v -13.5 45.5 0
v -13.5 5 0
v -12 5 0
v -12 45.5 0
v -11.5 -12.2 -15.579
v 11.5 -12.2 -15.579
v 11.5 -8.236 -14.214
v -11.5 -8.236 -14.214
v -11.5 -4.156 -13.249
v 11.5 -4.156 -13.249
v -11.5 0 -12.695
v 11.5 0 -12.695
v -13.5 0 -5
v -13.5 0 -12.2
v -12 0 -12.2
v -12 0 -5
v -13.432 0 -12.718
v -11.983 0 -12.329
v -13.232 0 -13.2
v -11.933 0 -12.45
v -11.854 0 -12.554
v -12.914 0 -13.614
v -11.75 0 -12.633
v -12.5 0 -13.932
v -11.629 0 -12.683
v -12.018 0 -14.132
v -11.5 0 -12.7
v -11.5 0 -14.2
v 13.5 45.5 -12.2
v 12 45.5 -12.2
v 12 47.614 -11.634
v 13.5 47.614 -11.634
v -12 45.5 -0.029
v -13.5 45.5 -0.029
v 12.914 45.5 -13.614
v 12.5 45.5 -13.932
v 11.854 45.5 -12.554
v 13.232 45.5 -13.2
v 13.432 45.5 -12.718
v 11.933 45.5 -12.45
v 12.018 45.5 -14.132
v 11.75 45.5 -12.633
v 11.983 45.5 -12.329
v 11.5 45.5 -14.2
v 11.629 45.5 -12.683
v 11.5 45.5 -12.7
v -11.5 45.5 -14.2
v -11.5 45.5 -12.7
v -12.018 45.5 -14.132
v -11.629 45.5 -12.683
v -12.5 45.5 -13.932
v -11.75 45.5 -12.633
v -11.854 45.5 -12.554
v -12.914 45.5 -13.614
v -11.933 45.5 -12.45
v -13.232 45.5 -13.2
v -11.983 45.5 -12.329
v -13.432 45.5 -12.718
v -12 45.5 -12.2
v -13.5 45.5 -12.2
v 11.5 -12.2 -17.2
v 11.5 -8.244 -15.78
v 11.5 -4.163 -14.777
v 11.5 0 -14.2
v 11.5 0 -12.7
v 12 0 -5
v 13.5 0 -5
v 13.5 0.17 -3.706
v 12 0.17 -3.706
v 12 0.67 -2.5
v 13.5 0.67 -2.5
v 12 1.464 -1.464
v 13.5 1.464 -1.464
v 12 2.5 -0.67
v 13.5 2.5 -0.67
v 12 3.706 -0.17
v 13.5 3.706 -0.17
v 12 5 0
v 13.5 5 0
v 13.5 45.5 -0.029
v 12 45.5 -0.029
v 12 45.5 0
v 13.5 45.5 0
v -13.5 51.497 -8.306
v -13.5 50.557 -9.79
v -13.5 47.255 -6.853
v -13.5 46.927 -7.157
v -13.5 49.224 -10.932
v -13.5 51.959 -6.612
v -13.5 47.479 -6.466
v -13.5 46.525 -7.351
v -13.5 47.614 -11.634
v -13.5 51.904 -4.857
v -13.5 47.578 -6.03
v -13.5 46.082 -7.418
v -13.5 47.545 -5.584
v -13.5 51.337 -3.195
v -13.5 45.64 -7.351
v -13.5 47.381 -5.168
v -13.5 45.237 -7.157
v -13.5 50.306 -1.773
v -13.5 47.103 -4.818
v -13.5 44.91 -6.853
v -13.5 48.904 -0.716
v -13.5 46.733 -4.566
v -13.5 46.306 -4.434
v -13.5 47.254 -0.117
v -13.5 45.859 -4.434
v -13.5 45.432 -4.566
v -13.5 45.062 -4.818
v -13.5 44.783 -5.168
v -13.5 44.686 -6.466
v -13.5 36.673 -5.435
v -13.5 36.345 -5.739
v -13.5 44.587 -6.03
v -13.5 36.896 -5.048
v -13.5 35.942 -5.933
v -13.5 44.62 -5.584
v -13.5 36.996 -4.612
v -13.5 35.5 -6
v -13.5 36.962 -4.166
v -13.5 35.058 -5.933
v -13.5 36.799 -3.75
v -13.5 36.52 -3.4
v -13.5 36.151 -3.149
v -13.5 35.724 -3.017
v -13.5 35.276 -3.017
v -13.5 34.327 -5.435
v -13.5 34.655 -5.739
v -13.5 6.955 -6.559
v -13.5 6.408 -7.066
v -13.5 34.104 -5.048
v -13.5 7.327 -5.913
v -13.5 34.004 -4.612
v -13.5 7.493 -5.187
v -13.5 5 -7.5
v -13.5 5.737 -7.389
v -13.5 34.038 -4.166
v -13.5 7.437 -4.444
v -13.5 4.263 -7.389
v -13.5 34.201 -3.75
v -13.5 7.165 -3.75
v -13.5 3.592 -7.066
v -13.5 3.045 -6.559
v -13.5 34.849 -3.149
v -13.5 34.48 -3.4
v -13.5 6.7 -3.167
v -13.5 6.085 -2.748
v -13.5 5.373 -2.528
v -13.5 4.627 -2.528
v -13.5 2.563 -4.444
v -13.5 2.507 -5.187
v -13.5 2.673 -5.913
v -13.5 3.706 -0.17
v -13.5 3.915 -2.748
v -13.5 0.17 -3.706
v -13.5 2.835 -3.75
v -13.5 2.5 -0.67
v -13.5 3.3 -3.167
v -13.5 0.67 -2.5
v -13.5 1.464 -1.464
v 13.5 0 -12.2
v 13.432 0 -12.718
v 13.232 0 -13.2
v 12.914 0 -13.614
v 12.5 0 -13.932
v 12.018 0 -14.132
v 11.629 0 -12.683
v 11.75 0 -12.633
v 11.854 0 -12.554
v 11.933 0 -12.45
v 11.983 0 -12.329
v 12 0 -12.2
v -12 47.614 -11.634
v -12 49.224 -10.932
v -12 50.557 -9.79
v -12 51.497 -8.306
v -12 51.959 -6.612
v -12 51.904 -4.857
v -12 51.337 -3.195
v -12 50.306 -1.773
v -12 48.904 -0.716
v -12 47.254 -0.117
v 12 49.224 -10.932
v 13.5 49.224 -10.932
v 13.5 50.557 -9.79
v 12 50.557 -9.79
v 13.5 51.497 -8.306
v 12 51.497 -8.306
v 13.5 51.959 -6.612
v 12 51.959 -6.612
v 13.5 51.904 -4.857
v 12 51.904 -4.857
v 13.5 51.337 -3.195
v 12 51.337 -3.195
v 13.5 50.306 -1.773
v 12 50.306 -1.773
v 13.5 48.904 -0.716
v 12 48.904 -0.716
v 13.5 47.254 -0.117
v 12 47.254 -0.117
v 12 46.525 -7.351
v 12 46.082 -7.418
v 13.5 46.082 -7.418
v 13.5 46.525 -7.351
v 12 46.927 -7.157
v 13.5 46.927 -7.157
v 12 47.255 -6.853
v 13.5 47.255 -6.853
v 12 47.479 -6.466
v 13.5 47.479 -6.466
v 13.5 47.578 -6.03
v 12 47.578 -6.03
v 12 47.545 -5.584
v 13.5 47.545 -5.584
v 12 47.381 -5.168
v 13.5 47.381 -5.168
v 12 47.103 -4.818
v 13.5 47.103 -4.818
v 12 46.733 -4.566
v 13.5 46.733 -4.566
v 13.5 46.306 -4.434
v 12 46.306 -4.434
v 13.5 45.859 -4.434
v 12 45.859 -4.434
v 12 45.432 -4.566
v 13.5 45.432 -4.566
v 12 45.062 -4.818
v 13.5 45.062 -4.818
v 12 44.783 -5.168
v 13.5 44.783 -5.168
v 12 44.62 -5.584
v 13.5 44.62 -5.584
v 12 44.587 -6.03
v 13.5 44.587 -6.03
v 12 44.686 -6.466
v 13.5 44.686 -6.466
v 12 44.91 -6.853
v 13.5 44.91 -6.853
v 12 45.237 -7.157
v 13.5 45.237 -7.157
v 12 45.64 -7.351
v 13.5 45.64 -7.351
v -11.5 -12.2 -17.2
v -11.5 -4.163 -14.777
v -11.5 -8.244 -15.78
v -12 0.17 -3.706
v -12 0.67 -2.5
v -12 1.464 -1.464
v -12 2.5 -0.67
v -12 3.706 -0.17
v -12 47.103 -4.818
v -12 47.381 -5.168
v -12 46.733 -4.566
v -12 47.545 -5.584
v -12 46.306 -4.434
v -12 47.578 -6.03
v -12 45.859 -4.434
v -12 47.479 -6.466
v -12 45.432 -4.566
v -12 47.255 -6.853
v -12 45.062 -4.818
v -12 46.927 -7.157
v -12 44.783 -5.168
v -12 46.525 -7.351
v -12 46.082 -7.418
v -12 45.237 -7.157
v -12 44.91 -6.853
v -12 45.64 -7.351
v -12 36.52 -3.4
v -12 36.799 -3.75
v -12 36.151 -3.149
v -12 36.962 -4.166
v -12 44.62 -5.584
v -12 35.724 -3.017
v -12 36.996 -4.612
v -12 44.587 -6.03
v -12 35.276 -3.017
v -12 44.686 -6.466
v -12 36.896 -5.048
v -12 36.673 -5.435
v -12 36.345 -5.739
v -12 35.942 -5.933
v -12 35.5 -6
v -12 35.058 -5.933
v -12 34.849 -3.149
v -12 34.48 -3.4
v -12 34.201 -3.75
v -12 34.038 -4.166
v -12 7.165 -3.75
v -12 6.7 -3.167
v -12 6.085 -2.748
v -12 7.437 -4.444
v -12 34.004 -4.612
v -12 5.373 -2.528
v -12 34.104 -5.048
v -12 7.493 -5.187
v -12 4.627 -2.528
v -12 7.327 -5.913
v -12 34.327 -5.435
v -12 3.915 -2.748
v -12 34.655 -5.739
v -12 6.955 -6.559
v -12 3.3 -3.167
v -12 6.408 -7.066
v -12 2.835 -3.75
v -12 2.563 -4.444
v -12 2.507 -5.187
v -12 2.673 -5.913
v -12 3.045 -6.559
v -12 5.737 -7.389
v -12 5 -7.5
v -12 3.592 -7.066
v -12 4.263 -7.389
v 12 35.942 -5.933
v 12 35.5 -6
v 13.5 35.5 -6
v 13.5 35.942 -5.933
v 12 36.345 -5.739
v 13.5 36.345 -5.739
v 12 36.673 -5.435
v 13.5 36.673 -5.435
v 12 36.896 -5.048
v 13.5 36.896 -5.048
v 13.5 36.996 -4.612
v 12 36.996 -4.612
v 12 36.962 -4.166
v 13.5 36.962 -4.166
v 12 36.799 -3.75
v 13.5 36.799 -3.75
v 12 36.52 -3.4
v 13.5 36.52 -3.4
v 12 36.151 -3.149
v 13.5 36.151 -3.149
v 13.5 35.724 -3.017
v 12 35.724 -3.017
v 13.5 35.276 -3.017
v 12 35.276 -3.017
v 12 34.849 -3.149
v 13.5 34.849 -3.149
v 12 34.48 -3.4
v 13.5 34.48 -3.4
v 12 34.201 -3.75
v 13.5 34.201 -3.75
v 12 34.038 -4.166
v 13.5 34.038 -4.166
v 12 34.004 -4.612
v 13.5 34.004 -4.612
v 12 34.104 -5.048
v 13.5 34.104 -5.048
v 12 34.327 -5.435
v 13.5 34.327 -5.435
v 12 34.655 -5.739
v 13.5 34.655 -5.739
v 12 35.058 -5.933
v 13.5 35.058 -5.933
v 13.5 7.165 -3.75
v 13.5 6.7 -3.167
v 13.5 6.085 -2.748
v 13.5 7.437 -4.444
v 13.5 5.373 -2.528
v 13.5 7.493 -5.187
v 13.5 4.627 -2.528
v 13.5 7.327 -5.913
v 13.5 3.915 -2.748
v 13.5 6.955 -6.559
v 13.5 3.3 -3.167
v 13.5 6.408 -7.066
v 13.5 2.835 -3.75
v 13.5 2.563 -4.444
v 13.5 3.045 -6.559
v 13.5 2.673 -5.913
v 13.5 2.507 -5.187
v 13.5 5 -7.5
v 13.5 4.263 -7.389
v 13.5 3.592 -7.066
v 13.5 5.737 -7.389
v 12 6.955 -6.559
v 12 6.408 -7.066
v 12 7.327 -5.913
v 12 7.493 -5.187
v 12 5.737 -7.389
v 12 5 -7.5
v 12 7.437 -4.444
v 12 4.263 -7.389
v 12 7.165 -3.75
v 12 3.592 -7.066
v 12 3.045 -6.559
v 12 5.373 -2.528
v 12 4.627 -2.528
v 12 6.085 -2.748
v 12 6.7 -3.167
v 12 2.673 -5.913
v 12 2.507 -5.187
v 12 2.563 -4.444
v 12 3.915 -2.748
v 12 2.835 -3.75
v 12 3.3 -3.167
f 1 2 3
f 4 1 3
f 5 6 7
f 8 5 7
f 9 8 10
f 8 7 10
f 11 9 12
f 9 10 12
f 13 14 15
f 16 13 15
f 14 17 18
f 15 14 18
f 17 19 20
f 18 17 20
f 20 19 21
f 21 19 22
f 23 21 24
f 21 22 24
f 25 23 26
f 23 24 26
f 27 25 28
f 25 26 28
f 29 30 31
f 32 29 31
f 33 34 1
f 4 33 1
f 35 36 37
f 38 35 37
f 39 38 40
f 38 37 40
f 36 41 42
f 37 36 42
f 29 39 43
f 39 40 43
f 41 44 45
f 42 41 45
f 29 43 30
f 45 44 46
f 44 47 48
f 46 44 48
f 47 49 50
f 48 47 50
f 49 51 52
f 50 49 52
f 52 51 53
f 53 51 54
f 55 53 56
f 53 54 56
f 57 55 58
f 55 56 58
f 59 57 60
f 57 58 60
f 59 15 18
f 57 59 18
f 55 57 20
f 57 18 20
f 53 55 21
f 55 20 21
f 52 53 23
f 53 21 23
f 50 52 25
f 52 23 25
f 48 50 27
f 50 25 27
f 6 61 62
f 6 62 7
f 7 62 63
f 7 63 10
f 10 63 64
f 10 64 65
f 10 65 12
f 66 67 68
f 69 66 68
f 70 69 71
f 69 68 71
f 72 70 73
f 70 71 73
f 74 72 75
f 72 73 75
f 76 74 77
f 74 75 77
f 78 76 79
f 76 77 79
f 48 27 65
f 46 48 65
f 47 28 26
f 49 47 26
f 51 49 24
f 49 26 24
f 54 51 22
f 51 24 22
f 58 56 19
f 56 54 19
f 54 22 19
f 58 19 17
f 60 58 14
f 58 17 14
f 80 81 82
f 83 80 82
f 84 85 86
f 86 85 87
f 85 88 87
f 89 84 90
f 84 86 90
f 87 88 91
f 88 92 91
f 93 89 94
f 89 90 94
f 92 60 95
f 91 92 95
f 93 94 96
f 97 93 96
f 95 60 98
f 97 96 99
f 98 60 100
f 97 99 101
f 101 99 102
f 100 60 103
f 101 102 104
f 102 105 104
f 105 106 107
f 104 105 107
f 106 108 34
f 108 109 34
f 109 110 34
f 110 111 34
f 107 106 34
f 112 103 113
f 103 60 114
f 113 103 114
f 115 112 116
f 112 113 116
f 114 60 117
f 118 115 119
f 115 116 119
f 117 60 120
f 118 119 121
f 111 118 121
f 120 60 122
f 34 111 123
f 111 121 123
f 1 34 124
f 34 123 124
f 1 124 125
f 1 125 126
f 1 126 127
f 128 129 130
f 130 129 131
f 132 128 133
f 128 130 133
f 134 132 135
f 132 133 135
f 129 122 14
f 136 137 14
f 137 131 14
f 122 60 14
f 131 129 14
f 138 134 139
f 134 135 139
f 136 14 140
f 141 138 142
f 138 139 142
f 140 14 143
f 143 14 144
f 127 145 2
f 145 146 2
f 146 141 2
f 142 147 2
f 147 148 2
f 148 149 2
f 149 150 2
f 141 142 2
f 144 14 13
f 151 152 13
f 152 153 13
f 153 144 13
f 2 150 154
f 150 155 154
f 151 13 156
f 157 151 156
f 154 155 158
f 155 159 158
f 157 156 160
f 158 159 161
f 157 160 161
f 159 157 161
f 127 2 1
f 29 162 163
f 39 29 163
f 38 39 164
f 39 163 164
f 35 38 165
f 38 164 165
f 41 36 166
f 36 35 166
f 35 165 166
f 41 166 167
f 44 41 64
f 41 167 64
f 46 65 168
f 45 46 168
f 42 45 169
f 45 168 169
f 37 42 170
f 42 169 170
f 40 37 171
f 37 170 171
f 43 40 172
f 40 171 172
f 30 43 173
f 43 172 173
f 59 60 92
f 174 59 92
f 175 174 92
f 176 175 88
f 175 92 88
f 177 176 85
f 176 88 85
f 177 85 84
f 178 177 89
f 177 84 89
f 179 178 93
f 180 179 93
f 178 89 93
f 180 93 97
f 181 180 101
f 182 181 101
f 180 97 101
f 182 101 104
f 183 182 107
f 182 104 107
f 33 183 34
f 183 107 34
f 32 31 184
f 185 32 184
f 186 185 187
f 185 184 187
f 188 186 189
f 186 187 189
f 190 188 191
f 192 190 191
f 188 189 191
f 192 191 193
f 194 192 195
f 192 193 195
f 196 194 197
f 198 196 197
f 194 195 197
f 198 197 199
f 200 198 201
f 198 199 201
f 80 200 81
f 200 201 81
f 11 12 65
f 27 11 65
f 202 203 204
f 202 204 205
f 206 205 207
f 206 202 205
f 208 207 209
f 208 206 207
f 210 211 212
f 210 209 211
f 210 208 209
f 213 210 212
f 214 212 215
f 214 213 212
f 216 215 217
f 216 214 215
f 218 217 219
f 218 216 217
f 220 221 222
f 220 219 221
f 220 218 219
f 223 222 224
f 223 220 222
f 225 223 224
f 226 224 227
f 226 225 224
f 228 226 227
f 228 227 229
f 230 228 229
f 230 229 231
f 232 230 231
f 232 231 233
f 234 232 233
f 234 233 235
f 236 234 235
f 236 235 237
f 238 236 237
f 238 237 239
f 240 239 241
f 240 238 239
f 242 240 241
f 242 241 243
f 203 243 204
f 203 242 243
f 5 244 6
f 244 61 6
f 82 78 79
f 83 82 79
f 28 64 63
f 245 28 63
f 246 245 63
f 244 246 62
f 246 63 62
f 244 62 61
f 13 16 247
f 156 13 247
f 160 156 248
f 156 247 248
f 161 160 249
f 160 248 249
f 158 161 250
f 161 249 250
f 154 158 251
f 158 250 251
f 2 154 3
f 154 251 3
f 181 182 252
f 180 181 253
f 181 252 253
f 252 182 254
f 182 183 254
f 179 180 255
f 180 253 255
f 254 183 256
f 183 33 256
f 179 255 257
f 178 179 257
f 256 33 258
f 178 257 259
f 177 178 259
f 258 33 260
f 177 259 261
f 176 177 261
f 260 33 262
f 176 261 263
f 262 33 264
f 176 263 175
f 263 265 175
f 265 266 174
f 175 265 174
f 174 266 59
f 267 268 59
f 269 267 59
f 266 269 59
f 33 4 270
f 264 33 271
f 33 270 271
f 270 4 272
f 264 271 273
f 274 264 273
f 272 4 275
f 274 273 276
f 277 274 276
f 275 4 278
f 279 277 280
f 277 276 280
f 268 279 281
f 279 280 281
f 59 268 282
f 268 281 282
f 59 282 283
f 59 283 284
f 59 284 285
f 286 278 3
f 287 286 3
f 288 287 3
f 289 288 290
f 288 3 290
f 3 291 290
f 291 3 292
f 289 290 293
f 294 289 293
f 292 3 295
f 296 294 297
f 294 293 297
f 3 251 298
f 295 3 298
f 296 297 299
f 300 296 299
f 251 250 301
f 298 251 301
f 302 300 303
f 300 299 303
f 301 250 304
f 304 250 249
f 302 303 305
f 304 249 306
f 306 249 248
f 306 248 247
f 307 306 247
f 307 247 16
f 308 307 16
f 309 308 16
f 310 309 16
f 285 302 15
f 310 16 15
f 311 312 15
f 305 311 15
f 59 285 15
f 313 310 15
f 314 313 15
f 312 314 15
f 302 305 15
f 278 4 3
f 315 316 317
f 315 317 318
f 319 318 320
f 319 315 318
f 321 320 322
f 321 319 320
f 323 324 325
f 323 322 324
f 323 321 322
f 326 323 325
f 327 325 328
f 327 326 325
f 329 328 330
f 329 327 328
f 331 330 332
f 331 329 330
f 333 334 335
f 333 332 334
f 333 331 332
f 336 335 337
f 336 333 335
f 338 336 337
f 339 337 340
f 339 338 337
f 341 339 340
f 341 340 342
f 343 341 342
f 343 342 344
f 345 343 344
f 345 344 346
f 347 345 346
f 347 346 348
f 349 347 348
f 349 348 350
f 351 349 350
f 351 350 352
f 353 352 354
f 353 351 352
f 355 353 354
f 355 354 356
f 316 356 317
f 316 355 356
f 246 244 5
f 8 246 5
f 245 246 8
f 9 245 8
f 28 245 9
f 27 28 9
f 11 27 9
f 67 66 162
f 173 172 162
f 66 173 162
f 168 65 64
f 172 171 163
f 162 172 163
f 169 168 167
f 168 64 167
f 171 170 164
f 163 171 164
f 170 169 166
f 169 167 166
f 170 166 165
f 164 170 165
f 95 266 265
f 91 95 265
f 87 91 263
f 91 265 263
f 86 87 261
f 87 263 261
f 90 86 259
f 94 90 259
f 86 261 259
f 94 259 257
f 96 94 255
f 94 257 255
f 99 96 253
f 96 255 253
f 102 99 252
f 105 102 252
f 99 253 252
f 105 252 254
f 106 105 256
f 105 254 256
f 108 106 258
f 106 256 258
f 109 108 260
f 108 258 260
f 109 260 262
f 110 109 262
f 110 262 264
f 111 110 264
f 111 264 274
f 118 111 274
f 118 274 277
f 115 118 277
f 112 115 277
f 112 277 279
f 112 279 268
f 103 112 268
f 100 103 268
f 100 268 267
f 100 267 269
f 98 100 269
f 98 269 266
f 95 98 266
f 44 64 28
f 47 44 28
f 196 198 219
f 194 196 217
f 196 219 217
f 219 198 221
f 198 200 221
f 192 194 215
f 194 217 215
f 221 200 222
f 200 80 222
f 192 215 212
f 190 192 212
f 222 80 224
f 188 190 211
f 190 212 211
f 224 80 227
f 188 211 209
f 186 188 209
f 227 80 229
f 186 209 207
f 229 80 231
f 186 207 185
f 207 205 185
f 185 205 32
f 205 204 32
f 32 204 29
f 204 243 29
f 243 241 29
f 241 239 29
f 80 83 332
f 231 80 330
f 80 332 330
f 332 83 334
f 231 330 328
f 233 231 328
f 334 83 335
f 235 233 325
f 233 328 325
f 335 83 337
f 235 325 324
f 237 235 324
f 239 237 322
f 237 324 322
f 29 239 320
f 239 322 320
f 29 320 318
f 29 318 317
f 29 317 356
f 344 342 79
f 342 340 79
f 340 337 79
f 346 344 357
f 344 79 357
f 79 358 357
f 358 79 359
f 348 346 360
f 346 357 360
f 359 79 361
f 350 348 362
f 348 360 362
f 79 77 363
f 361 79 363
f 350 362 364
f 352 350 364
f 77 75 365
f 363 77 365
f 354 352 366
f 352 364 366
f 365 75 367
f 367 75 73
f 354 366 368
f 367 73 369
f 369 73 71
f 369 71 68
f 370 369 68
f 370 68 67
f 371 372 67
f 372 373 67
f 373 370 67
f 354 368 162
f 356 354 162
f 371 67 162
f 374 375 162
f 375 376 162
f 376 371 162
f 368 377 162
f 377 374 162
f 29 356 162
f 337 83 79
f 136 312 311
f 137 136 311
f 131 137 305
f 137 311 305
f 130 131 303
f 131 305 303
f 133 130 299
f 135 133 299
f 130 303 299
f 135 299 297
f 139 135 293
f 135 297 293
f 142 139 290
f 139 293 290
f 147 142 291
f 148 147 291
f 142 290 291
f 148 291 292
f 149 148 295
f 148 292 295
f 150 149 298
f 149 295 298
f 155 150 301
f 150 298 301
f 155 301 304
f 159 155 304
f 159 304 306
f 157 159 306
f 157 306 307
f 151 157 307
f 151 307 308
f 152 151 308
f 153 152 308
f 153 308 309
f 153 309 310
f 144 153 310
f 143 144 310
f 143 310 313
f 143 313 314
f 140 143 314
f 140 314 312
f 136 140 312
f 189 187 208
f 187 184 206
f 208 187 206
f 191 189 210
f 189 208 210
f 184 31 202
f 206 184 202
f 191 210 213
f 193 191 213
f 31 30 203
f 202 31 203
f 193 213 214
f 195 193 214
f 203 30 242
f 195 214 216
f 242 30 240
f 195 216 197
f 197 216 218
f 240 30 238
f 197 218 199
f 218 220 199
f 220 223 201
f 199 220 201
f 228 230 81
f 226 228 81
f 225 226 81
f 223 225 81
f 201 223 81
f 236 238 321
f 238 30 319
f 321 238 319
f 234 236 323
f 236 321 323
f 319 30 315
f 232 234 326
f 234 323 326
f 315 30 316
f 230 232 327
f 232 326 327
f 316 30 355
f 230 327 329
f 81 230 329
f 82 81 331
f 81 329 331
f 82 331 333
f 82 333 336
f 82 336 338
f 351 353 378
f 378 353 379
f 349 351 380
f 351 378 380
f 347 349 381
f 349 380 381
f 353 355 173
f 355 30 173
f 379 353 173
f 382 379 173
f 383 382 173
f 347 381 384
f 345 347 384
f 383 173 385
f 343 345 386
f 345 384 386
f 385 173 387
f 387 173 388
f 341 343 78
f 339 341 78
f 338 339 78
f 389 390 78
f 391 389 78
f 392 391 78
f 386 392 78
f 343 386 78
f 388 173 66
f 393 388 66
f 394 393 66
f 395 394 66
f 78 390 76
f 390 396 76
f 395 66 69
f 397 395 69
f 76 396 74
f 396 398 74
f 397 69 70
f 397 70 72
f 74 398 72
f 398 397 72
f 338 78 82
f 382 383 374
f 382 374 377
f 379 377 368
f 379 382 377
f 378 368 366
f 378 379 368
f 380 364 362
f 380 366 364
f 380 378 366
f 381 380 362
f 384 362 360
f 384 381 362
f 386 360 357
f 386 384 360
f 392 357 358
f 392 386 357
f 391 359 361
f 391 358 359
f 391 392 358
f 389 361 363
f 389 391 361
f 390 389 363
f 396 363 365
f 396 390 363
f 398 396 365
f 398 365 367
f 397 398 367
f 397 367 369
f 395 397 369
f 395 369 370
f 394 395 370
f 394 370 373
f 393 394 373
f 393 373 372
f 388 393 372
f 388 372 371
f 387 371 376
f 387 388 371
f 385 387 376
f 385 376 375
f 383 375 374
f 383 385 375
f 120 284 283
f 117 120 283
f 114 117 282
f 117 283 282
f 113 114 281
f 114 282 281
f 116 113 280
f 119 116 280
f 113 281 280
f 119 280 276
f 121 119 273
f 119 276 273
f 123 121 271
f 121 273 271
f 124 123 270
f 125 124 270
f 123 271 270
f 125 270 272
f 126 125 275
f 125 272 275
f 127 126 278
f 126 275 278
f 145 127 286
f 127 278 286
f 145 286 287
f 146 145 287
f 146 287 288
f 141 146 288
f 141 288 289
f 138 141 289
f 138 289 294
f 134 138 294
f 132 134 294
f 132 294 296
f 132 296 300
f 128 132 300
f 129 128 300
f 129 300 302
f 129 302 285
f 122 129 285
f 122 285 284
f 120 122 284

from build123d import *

# Parameters (mm, degrees)
BOSS_EXTRUDE1_DEPTH      = 52
SKETCH2_R                = 2.5
SKETCH2_R_2              = 1.5
CUT_EXTRUDE1_DEPTH       = 26
BOSS_EXTRUDE2_DEPTH      = 11.5
BOSS_EXTRUDE2_DEPTH_BACK = 11.5


with BuildPart() as part:
    # Sketch1 → Boss-Extrude1 (new body)
    with BuildSketch(Plane(origin=(0, 0, 0), x_dir=(1, 0, 0), z_dir=(0, 1, 0))):
        with BuildLine():
            Line((13.5, 0), (13.5, 12.2))
            ThreePointArc((13.5, 12.2), (12.914213562, 13.614213562), (11.5, 14.2))
            Line((11.5, 14.2), (-11.5, 14.2))
            ThreePointArc((-11.5, 14.2), (-12.914213562, 13.614213562), (-13.5, 12.2))
            Line((-13.5, 12.2), (-13.5, 0))
            Line((-13.5, 0), (-12, 0))
            Line((-12, 0), (-12, 12.2))
            ThreePointArc((-12, 12.2), (-11.853553391, 12.553553391), (-11.5, 12.7))
            Line((-11.5, 12.7), (11.5, 12.7))
            ThreePointArc((11.5, 12.7), (11.853553391, 12.553553391), (12, 12.2))
            Line((12, 12.2), (12, 0))
            Line((12, 0), (13.5, 0))
        make_face()
    extrude(amount=BOSS_EXTRUDE1_DEPTH)

    # Sketch2 → Cut-Extrude1 (cut, symmetric)
    with BuildSketch(Plane(origin=(0, 0, 0), x_dir=(0, 0, -1), z_dir=(1, 0, 0))):
        with Locations((5, 5)):
            Circle(SKETCH2_R)
        with Locations((5.917597774, 46.082402226)):
            Circle(SKETCH2_R_2)
        with Locations((4.5, 35.5)):
            Circle(SKETCH2_R_2)
        with BuildLine():
            Line((12.2, 45.5), (11.633558293, 47.613989232))
            ThreePointArc((11.633558293, 47.613989232), (4.857073421, 51.904193317), (0.028729372, 45.5))
            Line((0.028729372, 45.5), (-2.330829718, 45.5))
            Line((-2.330829718, 45.5), (-2.330829718, 58.046352069))
            Line((-2.330829718, 58.046352069), (16.335993039, 58.046352069))
            Line((16.335993039, 58.046352069), (16.335993039, 45.5))
            Line((16.335993039, 45.5), (12.2, 45.5))
        make_face()
        with BuildLine():
            Line((0, 5), (0, 0))
            Line((0, 0), (5, 0))
            ThreePointArc((5, 0), (1.464466094, 1.464466094), (0, 5))
        make_face()
    extrude(amount=CUT_EXTRUDE1_DEPTH, both=True, mode=Mode.SUBTRACT)

    # Sketch4 → Boss-Extrude2 (add, two sides)
    with BuildSketch(Plane(origin=(0, 0, 0), x_dir=(0, 0, -1), z_dir=(1, 0, 0))) as boss_extrude2_sk:
        with BuildLine():
            Line((12.694645471, 0), (14.2, 0))
            ThreePointArc((14.2, 0), (15.225683929, -6.216635866), (17.200004735, -12.2))
            Line((17.200004735, -12.2), (15.579003919, -12.2))
            ThreePointArc((15.579003919, -12.2), (13.680583201, -6.207865902), (12.694645471, 0))
        make_face()
    extrude(amount=BOSS_EXTRUDE2_DEPTH)
    extrude(boss_extrude2_sk.sketch, amount=-BOSS_EXTRUDE2_DEPTH_BACK)


solid = part.part
